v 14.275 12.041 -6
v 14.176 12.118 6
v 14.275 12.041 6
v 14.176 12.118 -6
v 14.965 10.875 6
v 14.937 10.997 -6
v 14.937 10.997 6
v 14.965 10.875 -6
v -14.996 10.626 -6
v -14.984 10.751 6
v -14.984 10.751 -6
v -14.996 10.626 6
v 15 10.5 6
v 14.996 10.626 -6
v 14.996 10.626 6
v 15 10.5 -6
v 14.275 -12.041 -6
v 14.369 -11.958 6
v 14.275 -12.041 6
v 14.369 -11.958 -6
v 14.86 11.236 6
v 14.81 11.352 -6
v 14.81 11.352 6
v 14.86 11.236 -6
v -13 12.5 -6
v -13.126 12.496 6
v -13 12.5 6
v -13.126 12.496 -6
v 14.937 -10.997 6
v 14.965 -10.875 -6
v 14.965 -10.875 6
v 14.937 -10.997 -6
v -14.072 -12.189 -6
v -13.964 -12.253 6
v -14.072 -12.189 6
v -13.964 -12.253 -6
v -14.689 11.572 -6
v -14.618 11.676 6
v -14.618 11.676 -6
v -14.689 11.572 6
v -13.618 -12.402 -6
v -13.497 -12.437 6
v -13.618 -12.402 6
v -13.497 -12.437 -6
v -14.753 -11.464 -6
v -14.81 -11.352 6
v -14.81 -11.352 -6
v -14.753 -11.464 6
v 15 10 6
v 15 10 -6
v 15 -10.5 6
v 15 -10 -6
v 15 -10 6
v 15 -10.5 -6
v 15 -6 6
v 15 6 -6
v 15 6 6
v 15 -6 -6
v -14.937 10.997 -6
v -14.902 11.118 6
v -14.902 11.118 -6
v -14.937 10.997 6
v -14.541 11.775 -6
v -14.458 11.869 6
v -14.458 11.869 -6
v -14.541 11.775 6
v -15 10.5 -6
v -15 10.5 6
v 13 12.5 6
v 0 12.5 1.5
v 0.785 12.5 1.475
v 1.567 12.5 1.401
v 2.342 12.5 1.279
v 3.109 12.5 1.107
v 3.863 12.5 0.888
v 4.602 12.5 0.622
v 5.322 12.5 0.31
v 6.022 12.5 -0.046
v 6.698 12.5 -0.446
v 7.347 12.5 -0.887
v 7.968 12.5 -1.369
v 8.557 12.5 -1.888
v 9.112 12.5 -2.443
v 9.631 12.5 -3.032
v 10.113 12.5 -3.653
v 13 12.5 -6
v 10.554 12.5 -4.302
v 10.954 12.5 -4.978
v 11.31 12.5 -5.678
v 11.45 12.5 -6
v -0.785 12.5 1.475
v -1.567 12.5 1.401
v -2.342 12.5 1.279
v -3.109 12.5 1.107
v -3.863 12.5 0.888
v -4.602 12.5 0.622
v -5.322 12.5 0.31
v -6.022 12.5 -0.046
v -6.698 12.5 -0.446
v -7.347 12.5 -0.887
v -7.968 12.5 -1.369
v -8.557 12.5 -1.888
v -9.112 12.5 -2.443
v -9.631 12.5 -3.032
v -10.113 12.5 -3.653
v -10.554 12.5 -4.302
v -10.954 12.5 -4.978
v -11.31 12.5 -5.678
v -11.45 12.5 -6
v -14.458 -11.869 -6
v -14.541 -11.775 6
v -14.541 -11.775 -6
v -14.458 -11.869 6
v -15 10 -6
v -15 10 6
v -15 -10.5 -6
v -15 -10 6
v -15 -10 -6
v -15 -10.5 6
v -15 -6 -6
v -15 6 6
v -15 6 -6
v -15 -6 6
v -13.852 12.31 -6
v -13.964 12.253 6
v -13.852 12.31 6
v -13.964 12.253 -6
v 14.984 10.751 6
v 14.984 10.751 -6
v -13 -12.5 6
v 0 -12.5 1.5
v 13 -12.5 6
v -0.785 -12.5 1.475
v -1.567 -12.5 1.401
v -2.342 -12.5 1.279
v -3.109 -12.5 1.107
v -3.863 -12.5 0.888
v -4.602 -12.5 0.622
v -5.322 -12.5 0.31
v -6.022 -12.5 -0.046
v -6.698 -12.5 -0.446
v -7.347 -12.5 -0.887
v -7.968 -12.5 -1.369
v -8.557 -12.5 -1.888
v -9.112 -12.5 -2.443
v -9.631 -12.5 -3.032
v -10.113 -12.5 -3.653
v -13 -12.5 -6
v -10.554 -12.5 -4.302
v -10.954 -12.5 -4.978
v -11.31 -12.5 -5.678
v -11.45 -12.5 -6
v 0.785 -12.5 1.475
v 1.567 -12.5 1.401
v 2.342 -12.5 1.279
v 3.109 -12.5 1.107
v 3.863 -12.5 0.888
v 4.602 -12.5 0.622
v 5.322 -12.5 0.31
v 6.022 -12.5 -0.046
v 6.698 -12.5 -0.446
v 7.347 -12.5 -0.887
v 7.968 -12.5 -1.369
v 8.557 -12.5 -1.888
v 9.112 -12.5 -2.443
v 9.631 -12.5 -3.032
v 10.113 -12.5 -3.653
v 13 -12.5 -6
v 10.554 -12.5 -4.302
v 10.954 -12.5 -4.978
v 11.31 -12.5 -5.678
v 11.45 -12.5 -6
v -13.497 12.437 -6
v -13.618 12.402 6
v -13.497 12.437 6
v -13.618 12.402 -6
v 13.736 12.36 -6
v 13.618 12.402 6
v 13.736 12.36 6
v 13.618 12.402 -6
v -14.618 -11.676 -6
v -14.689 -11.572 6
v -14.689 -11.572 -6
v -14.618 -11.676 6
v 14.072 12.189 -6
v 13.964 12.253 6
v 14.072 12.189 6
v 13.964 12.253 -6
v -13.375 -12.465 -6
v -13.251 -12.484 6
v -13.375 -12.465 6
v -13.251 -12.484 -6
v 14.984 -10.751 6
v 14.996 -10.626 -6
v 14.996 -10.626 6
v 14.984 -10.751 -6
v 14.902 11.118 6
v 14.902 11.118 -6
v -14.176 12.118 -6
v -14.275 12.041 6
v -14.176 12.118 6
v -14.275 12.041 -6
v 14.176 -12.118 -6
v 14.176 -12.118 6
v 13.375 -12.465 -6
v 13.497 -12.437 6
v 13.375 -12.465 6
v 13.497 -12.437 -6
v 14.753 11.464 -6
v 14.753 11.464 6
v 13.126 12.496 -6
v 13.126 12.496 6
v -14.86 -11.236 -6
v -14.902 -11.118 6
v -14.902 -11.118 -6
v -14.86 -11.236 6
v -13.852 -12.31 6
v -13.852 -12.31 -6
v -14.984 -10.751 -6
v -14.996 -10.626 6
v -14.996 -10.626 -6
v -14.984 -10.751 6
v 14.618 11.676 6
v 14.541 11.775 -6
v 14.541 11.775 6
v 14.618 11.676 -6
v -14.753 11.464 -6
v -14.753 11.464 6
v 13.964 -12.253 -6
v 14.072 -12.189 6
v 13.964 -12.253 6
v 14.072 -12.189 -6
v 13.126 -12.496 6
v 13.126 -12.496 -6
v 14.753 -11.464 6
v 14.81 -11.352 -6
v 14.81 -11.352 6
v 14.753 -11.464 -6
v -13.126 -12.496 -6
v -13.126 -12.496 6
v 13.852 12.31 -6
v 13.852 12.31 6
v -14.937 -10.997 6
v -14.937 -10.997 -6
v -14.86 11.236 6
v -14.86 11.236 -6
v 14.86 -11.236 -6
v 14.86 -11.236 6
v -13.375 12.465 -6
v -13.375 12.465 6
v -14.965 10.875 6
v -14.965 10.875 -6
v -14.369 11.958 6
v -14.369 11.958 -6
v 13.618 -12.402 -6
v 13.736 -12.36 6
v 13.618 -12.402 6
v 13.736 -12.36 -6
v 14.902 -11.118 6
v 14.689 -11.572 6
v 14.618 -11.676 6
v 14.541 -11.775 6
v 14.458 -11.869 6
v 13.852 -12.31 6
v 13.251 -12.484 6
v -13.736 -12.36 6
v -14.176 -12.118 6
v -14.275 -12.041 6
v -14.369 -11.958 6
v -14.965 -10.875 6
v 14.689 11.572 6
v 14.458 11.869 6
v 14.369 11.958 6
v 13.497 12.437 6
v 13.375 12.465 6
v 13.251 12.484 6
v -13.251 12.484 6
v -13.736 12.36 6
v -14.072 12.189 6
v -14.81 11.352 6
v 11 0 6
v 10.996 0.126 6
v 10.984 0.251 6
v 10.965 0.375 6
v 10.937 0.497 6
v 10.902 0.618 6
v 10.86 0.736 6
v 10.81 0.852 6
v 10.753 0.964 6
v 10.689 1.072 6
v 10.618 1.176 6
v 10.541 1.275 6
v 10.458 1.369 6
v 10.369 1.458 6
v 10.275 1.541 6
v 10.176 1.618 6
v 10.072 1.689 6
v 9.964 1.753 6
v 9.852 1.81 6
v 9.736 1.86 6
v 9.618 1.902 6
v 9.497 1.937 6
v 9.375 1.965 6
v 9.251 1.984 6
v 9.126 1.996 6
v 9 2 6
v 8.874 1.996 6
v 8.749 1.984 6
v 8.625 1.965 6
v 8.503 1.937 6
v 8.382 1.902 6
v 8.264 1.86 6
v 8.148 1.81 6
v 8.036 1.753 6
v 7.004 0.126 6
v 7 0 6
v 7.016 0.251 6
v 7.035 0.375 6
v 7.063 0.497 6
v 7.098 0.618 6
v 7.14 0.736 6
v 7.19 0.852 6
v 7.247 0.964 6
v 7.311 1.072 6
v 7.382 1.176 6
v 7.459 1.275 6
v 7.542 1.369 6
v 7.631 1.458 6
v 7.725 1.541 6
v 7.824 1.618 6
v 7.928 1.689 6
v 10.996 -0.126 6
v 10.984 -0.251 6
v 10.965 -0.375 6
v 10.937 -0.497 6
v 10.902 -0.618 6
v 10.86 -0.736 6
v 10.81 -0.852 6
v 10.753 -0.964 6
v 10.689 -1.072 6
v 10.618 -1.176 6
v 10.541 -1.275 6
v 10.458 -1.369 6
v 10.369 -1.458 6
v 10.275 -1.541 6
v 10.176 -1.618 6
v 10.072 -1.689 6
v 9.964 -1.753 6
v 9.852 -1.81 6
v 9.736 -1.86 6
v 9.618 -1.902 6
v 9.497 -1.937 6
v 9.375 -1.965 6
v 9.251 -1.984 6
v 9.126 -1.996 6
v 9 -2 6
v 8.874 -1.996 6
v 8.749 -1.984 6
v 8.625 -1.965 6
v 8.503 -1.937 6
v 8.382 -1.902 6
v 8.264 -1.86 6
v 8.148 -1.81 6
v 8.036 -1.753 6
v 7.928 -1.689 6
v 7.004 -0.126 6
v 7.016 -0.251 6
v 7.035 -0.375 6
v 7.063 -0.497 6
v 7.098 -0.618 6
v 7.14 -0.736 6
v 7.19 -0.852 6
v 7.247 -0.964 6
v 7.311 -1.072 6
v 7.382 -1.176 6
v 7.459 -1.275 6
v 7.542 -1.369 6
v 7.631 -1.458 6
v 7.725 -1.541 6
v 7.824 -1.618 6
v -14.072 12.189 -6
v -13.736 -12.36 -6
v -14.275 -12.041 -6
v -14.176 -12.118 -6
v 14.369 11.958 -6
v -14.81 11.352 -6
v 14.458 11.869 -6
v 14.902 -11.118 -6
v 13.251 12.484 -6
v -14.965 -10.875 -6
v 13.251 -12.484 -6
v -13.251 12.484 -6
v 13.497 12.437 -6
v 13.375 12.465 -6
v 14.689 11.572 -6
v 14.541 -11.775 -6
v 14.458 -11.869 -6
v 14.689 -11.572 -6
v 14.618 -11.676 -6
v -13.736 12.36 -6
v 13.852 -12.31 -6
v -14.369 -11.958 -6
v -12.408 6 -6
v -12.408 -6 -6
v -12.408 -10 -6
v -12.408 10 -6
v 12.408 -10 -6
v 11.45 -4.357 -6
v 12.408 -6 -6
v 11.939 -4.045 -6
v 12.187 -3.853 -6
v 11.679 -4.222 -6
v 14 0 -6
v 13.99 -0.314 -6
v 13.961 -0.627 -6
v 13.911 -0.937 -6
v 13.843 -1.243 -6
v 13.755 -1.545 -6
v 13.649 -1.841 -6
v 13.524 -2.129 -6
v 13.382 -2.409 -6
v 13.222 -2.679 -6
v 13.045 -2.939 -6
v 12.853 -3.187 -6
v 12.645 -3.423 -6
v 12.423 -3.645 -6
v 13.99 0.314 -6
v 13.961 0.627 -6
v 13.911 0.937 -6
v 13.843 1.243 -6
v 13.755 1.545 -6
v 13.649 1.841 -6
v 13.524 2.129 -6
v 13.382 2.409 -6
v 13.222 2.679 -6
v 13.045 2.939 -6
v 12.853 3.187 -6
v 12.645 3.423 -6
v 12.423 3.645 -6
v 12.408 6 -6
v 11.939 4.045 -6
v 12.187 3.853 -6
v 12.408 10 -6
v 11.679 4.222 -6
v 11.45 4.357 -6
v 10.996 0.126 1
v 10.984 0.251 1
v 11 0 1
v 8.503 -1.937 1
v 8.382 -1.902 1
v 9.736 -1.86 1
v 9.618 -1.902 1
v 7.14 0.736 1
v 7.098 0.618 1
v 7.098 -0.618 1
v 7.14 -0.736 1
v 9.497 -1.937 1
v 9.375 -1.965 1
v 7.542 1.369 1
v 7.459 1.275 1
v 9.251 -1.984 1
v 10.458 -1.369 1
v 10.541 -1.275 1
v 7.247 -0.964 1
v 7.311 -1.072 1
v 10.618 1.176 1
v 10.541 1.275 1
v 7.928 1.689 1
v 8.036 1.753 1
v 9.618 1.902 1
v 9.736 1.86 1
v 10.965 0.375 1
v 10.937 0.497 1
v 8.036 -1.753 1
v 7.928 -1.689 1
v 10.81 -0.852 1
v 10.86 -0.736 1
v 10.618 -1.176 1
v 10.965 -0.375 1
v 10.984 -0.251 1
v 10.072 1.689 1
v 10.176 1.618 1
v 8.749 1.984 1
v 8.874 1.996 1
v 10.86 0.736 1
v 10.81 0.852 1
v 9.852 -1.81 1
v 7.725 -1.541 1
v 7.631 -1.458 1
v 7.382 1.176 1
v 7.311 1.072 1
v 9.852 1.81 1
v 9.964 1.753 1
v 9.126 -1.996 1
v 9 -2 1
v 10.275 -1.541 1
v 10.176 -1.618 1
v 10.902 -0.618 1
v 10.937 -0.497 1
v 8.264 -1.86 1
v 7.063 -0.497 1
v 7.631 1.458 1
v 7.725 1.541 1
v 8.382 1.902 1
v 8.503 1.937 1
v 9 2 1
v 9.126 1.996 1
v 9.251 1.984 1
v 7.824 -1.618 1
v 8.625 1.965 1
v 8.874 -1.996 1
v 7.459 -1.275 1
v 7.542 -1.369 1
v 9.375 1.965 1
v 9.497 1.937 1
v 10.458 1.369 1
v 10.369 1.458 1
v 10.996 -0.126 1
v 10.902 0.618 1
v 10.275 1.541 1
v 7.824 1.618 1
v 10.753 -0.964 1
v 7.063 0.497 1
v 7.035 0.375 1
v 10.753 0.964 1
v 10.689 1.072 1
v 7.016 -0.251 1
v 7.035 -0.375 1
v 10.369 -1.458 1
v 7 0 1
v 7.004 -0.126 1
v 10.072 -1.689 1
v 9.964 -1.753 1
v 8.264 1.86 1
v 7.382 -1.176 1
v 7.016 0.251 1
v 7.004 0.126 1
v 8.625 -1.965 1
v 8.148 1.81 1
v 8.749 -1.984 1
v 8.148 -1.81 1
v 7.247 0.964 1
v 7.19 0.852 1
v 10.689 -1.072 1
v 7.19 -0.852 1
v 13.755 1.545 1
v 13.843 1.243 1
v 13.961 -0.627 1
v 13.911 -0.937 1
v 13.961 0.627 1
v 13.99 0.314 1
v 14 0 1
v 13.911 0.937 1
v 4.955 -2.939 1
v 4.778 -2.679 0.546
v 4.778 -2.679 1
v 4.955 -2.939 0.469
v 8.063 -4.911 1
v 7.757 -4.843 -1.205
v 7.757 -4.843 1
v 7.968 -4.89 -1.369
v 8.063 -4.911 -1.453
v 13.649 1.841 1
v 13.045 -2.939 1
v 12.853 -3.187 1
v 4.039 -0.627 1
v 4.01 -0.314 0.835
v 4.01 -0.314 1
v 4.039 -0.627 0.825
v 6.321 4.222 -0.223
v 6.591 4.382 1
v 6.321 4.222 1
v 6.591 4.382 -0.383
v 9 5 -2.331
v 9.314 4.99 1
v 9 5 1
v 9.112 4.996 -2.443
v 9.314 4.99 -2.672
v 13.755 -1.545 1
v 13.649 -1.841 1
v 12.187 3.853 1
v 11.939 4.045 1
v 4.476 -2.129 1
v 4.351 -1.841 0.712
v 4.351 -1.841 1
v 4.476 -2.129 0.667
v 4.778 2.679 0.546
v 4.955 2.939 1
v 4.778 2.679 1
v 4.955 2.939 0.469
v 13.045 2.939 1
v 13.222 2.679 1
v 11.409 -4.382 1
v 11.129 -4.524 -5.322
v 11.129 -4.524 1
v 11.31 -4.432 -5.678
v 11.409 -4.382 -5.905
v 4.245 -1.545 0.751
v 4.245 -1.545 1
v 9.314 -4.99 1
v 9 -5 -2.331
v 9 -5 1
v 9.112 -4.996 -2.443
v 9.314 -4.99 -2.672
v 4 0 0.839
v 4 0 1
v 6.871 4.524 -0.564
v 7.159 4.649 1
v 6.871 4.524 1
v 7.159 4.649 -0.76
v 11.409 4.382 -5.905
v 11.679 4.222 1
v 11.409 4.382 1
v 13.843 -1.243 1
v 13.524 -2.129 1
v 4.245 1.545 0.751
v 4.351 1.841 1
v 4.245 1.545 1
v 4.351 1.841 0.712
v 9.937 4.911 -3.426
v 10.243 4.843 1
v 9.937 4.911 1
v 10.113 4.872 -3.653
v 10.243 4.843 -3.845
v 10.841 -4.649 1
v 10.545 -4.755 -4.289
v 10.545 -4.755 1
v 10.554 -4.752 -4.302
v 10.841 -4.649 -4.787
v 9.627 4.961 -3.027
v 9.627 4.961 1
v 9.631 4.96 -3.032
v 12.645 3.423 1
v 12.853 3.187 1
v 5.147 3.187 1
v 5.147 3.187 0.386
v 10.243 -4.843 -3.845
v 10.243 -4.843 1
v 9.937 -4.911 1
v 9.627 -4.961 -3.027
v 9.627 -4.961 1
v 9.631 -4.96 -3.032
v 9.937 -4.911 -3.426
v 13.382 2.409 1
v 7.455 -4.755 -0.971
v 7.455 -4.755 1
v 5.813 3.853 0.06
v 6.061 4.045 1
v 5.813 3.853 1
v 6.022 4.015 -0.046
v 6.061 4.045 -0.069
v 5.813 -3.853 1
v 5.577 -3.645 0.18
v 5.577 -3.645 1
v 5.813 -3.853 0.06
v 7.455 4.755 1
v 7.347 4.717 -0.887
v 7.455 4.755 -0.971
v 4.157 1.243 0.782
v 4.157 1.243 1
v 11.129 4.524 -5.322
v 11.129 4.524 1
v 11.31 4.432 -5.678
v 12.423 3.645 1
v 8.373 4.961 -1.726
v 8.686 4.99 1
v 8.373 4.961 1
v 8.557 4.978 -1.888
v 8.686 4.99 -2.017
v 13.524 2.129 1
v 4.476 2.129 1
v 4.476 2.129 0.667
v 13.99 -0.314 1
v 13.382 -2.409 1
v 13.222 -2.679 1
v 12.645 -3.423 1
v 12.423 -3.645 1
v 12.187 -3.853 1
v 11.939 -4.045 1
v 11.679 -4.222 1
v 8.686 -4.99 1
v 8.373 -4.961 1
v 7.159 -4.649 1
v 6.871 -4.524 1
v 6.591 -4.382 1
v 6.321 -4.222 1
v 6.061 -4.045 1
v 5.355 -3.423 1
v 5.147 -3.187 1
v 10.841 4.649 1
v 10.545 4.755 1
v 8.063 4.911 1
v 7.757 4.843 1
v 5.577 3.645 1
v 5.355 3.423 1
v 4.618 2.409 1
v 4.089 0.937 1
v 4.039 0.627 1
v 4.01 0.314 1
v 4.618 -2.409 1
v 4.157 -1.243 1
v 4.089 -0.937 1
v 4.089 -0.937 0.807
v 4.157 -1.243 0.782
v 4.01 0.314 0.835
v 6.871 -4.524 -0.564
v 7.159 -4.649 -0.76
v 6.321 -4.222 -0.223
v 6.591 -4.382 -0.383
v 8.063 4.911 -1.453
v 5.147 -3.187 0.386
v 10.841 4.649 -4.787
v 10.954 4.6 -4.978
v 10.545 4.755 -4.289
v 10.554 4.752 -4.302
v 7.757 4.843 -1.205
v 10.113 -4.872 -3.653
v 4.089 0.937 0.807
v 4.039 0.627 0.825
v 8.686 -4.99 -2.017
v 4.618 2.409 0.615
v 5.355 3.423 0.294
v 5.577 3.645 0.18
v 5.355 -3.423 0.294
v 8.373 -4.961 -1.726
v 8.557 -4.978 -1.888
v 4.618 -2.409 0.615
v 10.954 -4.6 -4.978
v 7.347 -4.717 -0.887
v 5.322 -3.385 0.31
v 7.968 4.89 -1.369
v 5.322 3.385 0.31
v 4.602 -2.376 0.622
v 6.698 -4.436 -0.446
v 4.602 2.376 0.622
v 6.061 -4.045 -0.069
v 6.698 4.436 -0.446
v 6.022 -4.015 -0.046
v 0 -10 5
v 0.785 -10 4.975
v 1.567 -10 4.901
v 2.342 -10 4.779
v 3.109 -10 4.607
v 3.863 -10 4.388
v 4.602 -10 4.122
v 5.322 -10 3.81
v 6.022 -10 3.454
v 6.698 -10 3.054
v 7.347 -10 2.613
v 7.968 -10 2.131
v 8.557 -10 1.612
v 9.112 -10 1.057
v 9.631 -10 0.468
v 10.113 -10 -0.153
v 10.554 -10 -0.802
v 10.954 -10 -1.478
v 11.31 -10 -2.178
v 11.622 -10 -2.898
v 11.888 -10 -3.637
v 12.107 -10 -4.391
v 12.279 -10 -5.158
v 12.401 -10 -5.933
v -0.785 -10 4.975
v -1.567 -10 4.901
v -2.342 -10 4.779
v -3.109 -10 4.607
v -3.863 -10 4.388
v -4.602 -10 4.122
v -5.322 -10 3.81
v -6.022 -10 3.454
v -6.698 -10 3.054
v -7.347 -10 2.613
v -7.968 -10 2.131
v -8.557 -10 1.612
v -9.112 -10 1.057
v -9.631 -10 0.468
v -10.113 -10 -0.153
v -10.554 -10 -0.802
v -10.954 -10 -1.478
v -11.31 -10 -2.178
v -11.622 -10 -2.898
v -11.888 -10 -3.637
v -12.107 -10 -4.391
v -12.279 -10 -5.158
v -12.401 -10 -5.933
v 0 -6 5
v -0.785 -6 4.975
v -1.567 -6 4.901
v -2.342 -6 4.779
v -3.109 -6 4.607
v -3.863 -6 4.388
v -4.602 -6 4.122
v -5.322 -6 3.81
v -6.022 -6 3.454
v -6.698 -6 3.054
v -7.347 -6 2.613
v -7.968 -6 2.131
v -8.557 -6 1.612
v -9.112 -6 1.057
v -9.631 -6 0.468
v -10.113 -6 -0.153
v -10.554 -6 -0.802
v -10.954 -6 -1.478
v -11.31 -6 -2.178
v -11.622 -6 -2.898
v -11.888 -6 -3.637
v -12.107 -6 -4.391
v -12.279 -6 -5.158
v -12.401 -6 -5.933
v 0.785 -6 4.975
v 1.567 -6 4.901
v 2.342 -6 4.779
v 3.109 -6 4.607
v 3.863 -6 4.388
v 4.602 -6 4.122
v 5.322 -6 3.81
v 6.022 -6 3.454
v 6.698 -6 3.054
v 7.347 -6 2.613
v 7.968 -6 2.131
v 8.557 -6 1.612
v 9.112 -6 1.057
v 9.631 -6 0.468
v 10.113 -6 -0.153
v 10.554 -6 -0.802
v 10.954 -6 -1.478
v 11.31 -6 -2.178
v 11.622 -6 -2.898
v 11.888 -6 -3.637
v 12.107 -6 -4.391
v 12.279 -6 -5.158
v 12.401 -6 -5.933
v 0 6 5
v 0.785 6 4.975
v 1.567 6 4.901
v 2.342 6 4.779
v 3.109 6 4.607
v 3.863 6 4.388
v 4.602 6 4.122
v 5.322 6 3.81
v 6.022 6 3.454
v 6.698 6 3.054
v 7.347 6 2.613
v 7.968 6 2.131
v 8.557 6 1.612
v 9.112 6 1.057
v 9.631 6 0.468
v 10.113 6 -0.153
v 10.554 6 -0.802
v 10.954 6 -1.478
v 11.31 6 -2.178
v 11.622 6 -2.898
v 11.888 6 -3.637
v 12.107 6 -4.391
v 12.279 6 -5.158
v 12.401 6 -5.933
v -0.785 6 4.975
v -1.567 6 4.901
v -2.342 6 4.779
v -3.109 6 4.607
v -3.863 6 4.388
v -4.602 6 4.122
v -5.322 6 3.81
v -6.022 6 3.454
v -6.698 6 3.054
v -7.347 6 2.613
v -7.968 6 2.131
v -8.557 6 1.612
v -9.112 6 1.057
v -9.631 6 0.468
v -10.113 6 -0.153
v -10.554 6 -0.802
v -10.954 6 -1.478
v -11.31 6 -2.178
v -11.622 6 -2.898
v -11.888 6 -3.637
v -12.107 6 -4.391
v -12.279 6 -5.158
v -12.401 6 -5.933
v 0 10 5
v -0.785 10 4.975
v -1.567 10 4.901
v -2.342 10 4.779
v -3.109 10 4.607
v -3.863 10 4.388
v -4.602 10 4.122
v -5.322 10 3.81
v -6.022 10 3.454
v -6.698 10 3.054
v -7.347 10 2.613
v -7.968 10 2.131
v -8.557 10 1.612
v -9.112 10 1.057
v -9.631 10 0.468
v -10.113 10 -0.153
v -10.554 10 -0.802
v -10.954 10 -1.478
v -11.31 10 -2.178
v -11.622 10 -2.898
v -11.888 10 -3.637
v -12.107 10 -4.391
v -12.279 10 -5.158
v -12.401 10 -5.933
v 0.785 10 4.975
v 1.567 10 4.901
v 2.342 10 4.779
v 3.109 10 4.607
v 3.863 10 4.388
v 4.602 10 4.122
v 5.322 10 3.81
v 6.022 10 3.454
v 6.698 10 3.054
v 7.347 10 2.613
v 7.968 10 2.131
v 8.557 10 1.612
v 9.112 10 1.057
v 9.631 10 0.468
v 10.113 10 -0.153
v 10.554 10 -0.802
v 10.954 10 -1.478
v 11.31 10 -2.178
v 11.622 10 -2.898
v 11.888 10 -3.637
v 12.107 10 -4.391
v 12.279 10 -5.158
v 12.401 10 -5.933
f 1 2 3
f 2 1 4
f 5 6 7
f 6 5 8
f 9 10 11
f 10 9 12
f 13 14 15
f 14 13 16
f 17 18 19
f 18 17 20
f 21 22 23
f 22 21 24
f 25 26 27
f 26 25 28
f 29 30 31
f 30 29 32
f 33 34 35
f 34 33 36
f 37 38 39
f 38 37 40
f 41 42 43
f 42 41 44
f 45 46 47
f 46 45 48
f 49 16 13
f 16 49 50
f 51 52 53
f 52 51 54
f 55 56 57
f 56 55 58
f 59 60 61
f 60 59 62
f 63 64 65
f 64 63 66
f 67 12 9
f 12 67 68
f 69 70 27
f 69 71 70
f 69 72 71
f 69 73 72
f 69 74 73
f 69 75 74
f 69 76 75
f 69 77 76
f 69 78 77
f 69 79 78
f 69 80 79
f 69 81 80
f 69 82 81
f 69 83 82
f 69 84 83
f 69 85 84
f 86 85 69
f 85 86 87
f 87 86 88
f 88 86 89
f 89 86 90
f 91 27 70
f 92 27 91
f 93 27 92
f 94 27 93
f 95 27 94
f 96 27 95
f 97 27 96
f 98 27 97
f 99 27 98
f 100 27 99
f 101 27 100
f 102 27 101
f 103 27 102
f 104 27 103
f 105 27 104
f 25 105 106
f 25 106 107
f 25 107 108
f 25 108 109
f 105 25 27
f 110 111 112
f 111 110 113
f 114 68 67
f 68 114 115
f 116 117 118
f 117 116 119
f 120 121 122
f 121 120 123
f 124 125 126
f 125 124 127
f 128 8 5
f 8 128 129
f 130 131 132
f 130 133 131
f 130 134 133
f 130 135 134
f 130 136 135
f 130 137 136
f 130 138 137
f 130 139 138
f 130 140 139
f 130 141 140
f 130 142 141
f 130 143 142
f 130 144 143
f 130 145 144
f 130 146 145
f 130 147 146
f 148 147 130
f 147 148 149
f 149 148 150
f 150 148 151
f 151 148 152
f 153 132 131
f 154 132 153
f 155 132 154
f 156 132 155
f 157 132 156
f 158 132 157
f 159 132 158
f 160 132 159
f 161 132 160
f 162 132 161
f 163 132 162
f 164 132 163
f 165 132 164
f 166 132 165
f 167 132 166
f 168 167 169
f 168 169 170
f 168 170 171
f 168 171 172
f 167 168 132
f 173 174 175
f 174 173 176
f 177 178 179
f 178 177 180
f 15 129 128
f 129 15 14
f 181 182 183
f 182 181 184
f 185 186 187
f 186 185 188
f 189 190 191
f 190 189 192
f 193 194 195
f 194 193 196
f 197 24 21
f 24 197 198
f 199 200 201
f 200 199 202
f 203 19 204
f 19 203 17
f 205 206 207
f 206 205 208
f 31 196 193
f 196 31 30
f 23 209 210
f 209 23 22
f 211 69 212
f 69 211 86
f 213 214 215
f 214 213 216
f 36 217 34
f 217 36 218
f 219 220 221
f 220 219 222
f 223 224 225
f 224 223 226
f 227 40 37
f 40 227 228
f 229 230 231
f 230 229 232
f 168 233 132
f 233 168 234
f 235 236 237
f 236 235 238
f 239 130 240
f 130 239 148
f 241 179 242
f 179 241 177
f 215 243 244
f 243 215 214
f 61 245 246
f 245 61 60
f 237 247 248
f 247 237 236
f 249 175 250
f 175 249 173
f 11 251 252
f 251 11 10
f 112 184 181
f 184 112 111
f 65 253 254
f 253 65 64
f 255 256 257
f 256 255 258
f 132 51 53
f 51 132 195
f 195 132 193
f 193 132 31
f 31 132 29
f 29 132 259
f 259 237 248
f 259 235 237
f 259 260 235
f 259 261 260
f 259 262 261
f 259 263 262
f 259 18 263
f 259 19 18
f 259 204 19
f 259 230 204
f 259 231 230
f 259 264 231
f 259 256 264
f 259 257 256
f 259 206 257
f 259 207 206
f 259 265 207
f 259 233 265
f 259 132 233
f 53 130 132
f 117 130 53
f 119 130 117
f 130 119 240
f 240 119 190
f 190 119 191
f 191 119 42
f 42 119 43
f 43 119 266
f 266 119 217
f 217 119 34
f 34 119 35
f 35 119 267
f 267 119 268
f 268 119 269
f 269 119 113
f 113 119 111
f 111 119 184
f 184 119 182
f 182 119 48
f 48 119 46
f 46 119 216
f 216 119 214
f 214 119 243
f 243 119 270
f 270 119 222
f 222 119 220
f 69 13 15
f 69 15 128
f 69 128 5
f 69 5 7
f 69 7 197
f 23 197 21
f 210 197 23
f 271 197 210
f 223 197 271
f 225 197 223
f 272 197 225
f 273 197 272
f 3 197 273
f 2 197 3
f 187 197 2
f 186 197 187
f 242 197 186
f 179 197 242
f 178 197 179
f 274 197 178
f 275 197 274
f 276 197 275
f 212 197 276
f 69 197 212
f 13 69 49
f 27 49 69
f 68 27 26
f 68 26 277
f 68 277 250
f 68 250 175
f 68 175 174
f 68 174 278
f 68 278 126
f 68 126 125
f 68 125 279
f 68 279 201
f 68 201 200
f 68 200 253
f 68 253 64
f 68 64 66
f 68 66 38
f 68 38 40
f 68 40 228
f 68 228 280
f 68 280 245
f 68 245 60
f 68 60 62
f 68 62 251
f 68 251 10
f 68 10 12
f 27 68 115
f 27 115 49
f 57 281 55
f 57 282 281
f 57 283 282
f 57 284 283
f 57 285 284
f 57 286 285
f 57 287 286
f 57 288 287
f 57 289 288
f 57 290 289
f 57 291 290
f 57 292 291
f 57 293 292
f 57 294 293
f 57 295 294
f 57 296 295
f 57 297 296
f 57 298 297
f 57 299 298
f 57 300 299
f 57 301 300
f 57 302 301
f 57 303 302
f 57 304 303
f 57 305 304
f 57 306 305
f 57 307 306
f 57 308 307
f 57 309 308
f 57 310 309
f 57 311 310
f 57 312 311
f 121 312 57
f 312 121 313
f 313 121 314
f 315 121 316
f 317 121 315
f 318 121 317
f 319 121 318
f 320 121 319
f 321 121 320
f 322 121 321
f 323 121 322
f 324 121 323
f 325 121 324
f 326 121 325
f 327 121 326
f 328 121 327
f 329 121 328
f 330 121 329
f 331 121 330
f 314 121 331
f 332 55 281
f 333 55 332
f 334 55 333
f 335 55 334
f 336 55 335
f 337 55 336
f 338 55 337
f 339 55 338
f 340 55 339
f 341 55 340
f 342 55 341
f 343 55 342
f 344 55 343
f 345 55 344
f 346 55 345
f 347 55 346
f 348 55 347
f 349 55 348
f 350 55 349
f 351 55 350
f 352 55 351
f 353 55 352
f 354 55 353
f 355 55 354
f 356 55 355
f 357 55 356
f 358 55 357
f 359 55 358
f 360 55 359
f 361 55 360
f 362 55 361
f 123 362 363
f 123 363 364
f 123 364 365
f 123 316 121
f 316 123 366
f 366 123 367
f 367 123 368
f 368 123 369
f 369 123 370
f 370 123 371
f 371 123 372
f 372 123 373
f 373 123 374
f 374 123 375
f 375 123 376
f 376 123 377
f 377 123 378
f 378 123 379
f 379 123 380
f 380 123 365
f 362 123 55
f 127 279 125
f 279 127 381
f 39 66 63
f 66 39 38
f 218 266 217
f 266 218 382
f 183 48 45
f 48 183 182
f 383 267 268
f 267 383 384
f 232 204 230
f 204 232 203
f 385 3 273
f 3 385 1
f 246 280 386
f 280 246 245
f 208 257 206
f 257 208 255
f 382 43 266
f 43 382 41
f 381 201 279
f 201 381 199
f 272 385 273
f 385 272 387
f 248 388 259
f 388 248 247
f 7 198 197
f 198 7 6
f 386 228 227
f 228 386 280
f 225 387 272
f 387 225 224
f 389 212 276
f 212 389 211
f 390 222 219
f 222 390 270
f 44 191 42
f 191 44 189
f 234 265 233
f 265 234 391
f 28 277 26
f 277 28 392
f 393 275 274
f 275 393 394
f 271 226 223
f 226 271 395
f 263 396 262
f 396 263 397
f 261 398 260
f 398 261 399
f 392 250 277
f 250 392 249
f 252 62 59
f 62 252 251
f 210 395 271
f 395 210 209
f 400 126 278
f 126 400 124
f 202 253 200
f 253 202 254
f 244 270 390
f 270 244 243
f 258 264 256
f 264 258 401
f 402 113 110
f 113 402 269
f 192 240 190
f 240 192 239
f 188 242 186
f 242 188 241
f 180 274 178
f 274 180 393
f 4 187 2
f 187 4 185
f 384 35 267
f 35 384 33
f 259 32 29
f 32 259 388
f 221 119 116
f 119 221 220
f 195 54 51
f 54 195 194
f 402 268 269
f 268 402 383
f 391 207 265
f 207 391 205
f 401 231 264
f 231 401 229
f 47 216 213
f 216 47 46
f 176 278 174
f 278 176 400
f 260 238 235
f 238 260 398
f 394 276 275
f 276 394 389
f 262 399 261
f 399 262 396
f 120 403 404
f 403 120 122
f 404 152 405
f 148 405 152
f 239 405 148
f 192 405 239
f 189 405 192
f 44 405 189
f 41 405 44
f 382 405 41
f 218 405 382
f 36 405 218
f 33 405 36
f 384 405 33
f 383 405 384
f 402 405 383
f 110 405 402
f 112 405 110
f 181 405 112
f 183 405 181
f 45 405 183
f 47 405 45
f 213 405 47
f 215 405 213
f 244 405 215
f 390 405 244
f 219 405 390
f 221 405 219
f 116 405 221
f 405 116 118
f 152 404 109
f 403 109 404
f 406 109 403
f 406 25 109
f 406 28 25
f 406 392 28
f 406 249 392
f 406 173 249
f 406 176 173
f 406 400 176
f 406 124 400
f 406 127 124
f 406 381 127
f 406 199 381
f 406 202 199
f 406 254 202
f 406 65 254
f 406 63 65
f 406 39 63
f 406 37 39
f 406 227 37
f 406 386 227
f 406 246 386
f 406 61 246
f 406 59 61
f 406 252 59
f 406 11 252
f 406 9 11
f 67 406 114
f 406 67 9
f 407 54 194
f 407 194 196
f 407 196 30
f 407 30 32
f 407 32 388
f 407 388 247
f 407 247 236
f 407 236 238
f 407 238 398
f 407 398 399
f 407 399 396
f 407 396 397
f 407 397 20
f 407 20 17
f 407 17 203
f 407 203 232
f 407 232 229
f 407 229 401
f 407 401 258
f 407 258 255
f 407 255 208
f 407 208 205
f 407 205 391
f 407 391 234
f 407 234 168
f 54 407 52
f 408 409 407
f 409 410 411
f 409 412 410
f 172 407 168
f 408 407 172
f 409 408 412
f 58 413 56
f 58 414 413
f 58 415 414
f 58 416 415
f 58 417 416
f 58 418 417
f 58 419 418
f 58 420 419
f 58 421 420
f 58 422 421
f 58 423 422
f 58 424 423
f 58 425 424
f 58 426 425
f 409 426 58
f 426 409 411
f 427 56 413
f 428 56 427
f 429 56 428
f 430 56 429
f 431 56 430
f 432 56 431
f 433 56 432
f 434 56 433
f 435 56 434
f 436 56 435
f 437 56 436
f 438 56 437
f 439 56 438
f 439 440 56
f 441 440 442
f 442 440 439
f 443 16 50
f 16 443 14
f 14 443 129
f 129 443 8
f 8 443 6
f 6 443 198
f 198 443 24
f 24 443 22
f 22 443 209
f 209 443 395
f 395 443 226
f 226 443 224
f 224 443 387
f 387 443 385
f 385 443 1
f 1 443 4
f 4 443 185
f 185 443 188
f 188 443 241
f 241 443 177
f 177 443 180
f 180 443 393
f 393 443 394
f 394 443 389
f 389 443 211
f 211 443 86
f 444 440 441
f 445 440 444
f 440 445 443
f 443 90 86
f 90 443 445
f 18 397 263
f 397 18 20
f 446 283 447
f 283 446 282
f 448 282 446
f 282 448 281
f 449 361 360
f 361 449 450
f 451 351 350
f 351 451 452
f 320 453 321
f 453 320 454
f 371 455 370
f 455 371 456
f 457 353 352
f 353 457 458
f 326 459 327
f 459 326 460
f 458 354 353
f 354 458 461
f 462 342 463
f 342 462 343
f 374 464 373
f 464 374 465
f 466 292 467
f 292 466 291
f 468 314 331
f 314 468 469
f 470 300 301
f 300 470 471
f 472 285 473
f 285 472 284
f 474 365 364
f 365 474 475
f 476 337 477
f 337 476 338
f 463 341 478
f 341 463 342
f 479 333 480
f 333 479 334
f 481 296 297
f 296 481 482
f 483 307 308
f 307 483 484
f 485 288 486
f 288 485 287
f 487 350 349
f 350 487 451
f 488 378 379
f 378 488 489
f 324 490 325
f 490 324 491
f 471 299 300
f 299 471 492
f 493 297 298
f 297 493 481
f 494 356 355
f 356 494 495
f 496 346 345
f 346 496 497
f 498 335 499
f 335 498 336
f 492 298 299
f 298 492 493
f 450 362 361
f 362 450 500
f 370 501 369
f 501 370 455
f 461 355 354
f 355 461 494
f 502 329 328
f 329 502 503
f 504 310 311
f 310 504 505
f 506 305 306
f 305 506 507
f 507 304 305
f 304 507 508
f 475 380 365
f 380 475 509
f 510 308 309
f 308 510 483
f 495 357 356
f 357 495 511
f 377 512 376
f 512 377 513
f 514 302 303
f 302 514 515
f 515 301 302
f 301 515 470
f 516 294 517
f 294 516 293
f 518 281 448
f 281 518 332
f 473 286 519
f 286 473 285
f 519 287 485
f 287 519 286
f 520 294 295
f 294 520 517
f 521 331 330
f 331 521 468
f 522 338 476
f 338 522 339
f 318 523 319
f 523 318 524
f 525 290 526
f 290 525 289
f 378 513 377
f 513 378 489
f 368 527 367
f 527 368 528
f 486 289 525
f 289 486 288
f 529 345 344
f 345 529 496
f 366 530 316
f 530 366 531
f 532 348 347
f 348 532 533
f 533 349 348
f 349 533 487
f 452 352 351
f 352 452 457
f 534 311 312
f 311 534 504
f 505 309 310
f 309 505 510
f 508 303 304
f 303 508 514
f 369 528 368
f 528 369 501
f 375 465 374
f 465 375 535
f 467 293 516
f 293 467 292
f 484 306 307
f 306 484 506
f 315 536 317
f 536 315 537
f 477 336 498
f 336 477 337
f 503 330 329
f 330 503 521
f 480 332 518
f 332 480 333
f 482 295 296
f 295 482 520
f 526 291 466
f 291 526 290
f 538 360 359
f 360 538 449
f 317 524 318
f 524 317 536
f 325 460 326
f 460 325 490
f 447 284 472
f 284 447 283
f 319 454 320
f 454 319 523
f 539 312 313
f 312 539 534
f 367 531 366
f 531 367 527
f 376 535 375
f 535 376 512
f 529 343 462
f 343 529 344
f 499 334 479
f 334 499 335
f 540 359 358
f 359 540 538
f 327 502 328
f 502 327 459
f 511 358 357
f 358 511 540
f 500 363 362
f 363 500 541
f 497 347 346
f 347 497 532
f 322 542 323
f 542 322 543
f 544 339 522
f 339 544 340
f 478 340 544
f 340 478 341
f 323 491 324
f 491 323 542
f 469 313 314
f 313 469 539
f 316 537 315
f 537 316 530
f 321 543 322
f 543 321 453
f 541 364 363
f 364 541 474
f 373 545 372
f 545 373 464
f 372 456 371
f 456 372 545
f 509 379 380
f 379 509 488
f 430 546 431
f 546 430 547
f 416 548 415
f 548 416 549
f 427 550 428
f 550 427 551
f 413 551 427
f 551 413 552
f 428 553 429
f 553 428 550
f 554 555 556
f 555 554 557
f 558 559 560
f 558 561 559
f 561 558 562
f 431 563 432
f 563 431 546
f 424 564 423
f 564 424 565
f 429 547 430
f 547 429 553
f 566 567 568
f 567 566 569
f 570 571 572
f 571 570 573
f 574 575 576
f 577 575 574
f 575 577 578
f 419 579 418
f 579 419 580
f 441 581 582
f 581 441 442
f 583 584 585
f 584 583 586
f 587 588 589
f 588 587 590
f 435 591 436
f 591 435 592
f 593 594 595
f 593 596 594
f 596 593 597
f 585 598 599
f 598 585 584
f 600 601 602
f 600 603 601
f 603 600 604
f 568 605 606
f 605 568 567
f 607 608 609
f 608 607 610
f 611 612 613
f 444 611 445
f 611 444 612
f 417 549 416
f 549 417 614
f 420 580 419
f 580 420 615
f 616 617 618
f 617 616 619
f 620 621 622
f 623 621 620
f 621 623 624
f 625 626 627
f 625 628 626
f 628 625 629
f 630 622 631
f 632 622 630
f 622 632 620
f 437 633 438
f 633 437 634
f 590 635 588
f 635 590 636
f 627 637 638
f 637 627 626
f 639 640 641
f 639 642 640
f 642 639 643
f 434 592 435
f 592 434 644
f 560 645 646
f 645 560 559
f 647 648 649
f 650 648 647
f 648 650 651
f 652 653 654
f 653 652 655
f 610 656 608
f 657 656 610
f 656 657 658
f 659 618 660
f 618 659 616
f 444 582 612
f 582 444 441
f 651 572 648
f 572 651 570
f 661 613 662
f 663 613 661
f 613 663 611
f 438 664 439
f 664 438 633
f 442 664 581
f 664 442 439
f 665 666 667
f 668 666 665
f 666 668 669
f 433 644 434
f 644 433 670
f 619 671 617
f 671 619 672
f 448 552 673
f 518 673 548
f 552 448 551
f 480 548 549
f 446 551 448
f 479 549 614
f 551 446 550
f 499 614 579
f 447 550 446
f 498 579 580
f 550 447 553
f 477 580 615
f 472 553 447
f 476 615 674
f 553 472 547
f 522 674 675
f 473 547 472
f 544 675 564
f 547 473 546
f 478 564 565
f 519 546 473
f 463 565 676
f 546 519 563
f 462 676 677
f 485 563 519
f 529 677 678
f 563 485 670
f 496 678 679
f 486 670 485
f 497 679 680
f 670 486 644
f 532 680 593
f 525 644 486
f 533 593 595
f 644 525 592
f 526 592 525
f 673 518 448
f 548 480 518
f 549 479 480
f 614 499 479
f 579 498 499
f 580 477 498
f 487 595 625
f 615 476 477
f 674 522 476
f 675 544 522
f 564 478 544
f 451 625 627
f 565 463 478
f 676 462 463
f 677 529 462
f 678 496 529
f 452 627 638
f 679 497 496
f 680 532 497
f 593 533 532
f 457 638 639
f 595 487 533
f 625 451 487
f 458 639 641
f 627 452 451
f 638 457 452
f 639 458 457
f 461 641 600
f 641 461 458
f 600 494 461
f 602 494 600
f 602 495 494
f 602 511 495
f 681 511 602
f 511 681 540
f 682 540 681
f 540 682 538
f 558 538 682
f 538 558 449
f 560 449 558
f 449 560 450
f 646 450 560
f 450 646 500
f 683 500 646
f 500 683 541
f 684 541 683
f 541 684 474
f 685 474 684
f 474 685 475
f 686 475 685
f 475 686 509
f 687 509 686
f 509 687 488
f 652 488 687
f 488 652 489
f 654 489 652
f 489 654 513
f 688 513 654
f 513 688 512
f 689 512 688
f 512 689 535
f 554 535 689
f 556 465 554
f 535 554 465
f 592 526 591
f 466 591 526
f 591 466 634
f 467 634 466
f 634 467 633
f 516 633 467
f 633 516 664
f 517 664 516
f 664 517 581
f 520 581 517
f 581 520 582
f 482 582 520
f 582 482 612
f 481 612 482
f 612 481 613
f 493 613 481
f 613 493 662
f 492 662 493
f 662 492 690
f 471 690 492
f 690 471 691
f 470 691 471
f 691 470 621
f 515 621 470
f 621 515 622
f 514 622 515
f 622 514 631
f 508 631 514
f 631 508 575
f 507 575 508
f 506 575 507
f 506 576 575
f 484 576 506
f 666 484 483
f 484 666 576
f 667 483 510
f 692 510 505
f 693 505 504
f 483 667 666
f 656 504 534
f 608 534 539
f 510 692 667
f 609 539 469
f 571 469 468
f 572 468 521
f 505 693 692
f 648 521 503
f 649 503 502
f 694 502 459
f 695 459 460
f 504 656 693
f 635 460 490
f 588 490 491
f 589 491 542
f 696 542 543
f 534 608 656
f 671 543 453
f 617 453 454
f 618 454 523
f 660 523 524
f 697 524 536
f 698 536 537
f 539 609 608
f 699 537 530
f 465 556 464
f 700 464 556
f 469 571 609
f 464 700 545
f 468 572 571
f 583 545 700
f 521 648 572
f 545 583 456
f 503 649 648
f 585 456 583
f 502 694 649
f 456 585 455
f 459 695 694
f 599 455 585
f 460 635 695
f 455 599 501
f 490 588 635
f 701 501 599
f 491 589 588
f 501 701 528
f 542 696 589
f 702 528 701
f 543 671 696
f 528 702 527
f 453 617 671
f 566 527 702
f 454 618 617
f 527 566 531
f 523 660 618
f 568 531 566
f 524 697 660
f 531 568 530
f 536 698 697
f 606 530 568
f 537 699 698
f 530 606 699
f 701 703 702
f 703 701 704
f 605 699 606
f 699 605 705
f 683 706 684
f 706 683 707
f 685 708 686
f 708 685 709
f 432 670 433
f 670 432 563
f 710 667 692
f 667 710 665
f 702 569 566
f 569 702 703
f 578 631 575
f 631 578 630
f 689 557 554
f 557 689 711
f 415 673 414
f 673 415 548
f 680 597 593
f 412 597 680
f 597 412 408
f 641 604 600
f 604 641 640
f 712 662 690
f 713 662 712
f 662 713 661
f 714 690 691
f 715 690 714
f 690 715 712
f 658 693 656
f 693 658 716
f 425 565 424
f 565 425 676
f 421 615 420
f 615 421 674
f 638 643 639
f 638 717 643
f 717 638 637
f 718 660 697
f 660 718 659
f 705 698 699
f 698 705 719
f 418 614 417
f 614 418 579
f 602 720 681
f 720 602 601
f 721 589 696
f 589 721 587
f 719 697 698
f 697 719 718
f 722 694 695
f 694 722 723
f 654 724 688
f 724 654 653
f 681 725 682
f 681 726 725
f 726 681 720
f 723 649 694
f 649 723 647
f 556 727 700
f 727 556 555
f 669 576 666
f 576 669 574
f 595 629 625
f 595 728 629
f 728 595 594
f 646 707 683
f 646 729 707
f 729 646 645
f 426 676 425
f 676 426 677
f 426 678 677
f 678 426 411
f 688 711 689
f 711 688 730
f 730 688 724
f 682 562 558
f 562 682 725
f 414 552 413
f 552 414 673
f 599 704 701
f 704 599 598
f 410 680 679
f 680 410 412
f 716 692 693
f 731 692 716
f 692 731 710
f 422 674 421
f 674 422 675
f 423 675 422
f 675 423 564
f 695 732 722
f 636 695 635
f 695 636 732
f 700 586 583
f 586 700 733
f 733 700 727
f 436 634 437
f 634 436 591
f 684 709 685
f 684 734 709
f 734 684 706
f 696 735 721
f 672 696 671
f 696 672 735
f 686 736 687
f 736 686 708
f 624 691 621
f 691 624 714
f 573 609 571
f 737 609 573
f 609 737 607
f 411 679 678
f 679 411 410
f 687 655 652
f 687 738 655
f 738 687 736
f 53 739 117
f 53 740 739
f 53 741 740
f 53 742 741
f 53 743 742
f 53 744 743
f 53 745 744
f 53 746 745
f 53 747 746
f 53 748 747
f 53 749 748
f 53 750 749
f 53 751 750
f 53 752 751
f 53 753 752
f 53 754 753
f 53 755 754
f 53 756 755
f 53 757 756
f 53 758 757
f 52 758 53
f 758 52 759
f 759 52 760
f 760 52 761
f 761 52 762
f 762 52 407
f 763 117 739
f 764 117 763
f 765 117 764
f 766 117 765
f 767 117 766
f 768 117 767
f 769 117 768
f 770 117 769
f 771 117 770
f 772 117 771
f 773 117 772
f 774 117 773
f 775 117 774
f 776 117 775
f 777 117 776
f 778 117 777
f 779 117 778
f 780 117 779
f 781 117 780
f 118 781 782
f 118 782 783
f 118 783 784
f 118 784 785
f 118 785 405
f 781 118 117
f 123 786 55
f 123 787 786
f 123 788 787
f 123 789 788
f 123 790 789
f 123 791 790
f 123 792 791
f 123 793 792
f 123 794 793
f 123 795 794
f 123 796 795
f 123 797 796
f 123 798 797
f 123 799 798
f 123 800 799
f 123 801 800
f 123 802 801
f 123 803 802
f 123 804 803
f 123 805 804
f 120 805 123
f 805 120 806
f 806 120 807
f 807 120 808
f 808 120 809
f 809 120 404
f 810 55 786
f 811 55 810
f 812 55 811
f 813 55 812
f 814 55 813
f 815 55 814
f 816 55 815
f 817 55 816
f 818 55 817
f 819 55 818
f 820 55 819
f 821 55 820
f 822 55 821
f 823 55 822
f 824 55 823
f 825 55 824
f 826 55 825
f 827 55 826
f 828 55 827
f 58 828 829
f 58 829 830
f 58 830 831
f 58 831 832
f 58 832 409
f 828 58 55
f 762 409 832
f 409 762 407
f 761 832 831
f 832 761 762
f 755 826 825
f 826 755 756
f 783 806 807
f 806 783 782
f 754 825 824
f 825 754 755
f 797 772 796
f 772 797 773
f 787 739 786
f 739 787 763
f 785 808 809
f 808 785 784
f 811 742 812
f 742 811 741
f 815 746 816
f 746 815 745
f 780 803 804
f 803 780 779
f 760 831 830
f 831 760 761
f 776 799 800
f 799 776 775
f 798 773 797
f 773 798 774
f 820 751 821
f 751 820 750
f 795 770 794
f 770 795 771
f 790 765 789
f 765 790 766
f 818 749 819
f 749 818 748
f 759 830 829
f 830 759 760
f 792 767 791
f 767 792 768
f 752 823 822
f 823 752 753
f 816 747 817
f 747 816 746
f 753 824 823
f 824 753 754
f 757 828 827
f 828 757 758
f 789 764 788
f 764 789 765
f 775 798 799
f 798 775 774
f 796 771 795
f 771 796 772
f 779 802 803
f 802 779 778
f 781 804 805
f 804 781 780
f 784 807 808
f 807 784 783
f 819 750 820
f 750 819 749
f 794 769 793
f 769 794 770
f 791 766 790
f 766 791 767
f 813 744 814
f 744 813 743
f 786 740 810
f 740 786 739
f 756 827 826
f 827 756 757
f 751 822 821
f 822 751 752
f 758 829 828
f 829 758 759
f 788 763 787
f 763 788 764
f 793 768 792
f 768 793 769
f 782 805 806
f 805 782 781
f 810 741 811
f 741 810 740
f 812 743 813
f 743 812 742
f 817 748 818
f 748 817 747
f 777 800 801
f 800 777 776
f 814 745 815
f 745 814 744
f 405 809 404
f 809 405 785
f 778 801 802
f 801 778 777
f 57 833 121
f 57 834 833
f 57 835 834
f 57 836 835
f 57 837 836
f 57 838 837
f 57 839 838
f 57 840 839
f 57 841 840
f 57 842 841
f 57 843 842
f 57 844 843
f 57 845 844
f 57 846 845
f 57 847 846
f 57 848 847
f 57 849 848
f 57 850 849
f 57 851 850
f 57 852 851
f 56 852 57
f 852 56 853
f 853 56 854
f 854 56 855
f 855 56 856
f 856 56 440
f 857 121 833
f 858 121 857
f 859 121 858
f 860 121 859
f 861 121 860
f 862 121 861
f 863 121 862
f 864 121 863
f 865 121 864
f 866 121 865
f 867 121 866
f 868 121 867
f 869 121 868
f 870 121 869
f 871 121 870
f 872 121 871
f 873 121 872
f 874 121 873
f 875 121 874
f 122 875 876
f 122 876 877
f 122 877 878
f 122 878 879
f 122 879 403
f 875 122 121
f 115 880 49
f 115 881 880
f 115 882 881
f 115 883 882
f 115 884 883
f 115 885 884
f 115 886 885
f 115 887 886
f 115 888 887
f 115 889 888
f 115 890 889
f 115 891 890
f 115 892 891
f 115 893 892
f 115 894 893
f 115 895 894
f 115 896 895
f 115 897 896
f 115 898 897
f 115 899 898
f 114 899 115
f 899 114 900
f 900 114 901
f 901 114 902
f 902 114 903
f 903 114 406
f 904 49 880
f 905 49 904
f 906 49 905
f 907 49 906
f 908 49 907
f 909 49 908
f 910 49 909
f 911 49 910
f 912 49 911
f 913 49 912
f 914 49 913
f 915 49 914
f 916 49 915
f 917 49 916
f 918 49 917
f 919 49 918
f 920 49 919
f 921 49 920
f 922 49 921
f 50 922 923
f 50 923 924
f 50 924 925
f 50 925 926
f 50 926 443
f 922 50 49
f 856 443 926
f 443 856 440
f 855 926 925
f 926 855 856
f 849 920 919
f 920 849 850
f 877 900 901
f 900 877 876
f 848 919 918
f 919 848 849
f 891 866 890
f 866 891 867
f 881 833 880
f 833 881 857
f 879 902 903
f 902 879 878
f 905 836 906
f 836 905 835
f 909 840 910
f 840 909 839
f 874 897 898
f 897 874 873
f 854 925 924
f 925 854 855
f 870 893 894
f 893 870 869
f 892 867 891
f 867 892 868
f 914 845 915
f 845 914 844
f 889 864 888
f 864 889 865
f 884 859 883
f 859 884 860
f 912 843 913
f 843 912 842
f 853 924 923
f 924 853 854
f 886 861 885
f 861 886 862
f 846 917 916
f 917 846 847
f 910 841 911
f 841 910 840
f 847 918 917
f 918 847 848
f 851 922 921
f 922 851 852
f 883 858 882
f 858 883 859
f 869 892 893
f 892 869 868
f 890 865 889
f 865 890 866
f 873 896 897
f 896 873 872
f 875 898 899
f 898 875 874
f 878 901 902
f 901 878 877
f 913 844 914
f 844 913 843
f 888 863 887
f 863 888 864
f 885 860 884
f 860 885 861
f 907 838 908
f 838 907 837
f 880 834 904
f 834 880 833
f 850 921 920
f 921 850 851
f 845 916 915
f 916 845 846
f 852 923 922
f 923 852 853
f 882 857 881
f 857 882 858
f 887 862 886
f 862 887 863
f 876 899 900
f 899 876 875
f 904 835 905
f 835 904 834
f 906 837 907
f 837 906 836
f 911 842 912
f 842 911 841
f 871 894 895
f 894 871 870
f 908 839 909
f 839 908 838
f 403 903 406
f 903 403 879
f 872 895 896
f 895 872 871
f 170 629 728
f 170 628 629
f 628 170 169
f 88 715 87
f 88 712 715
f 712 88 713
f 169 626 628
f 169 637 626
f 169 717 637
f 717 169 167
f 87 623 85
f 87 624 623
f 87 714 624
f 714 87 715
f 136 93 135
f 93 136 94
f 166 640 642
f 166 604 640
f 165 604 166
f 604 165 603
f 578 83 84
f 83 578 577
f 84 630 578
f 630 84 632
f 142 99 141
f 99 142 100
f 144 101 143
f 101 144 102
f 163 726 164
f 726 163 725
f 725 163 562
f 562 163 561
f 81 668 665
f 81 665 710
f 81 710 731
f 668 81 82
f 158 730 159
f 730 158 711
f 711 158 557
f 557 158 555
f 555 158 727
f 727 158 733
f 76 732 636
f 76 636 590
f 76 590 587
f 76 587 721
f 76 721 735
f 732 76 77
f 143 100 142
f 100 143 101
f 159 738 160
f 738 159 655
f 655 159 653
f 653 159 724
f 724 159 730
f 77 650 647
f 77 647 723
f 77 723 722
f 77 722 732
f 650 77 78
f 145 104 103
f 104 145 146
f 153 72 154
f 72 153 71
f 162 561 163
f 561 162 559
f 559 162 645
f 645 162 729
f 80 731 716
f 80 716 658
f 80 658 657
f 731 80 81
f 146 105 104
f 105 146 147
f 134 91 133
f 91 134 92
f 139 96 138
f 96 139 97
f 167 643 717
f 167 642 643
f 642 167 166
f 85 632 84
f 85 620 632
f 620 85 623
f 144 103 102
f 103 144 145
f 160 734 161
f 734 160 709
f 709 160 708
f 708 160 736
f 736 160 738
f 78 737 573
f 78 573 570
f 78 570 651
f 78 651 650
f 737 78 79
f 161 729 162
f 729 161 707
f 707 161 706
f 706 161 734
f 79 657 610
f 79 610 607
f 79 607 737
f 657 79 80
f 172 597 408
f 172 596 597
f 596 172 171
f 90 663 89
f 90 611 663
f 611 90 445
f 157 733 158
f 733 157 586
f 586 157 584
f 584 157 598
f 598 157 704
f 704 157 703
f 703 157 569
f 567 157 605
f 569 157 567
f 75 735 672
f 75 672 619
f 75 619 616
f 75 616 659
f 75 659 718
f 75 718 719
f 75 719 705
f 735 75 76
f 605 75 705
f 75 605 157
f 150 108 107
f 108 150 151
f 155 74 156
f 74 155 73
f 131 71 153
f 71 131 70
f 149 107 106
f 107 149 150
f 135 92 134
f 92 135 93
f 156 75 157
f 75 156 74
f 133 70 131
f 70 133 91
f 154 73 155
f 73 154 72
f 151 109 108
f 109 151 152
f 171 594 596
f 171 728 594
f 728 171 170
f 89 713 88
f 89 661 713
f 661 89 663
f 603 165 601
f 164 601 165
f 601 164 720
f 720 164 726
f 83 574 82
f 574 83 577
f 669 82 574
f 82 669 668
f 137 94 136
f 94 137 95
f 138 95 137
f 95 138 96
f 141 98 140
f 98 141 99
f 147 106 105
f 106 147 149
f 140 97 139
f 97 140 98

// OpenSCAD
// file: ../roundedcube.scad
// Higher definition curves
$fs = 0.01;

module roundedcube(size = [1, 1, 1], center = false, radius = 0.5, apply_to = "all") {
	// If single value, convert to [x, y, z] vector
	size = (size[0] == undef) ? [size, size, size] : size;

	translate_min = radius;
	translate_xmax = size[0] - radius;
	translate_ymax = size[1] - radius;
	translate_zmax = size[2] - radius;

	diameter = radius * 2;

	module build_point(type = "sphere", rotate = [0, 0, 0]) {
		if (type == "sphere") {
			sphere(r = radius);
		} else if (type == "cylinder") {
			rotate(a = rotate)
			cylinder(h = diameter, r = radius, center = true);
		}
	}

	obj_translate = (center == false) ?
		[0, 0, 0] : [
			-(size[0] / 2),
			-(size[1] / 2),
			-(size[2] / 2)
		];

	translate(v = obj_translate) {
		hull() {
			for (translate_x = [translate_min, translate_xmax]) {
				x_at = (translate_x == translate_min) ? "min" : "max";
				for (translate_y = [translate_min, translate_ymax]) {
					y_at = (translate_y == translate_min) ? "min" : "max";
					for (translate_z = [translate_min, translate_zmax]) {
						z_at = (translate_z == translate_min) ? "min" : "max";

						translate(v = [translate_x, translate_y, translate_z])
						if (
							(apply_to == "all") ||
							(apply_to == "xmin" && x_at == "min") || (apply_to == "xmax" && x_at == "max") ||
							(apply_to == "ymin" && y_at == "min") || (apply_to == "ymax" && y_at == "max") ||
							(apply_to == "zmin" && z_at == "min") || (apply_to == "zmax" && z_at == "max")
						) {
							build_point("sphere");
						} else {
							rotate =
								(apply_to == "xmin" || apply_to == "xmax" || apply_to == "x") ? [0, 90, 0] : (
								(apply_to == "ymin" || apply_to == "ymax" || apply_to == "y") ? [90, 90, 0] :
								[0, 0, 0]
							);
							build_point("cylinder", rotate);
						}
					}
				}
			}
		}
	}
}

module roundedcubez(size = [1, 1, 1], center = false, radius = 0.5, apply_to = "all") {
	intersection() {
		roundedcube(size, center, radius, apply_to="z");
		scale([1.0, 1.0, 1.1])
			cube(size, center);
	}
}
// main file
$fn = $preview ? 30 : 100;

include <../roundedcube.scad>

difference() {
	roundedcubez(size=[30, 25, 12], center=true, radius=2);
	translate([0, 0, -11])
		rotate([90, 0, 0])
			cylinder(h=30, d=25, center=true);
	translate([9, 0, 0]) {
		cylinder(h=30, d=4, center=true);
		translate([0, 0, -14])
			cylinder(h=30, d=10, center=true);
	}
	for (i=[-1, 1])
		translate([0, 8 * i, -7.5])
			rotate([90, 0, 0])
				difference() {
					cylinder(h=4, d=50, center=true);
					cylinder(h=6, d=25, center=true);
				}
}
